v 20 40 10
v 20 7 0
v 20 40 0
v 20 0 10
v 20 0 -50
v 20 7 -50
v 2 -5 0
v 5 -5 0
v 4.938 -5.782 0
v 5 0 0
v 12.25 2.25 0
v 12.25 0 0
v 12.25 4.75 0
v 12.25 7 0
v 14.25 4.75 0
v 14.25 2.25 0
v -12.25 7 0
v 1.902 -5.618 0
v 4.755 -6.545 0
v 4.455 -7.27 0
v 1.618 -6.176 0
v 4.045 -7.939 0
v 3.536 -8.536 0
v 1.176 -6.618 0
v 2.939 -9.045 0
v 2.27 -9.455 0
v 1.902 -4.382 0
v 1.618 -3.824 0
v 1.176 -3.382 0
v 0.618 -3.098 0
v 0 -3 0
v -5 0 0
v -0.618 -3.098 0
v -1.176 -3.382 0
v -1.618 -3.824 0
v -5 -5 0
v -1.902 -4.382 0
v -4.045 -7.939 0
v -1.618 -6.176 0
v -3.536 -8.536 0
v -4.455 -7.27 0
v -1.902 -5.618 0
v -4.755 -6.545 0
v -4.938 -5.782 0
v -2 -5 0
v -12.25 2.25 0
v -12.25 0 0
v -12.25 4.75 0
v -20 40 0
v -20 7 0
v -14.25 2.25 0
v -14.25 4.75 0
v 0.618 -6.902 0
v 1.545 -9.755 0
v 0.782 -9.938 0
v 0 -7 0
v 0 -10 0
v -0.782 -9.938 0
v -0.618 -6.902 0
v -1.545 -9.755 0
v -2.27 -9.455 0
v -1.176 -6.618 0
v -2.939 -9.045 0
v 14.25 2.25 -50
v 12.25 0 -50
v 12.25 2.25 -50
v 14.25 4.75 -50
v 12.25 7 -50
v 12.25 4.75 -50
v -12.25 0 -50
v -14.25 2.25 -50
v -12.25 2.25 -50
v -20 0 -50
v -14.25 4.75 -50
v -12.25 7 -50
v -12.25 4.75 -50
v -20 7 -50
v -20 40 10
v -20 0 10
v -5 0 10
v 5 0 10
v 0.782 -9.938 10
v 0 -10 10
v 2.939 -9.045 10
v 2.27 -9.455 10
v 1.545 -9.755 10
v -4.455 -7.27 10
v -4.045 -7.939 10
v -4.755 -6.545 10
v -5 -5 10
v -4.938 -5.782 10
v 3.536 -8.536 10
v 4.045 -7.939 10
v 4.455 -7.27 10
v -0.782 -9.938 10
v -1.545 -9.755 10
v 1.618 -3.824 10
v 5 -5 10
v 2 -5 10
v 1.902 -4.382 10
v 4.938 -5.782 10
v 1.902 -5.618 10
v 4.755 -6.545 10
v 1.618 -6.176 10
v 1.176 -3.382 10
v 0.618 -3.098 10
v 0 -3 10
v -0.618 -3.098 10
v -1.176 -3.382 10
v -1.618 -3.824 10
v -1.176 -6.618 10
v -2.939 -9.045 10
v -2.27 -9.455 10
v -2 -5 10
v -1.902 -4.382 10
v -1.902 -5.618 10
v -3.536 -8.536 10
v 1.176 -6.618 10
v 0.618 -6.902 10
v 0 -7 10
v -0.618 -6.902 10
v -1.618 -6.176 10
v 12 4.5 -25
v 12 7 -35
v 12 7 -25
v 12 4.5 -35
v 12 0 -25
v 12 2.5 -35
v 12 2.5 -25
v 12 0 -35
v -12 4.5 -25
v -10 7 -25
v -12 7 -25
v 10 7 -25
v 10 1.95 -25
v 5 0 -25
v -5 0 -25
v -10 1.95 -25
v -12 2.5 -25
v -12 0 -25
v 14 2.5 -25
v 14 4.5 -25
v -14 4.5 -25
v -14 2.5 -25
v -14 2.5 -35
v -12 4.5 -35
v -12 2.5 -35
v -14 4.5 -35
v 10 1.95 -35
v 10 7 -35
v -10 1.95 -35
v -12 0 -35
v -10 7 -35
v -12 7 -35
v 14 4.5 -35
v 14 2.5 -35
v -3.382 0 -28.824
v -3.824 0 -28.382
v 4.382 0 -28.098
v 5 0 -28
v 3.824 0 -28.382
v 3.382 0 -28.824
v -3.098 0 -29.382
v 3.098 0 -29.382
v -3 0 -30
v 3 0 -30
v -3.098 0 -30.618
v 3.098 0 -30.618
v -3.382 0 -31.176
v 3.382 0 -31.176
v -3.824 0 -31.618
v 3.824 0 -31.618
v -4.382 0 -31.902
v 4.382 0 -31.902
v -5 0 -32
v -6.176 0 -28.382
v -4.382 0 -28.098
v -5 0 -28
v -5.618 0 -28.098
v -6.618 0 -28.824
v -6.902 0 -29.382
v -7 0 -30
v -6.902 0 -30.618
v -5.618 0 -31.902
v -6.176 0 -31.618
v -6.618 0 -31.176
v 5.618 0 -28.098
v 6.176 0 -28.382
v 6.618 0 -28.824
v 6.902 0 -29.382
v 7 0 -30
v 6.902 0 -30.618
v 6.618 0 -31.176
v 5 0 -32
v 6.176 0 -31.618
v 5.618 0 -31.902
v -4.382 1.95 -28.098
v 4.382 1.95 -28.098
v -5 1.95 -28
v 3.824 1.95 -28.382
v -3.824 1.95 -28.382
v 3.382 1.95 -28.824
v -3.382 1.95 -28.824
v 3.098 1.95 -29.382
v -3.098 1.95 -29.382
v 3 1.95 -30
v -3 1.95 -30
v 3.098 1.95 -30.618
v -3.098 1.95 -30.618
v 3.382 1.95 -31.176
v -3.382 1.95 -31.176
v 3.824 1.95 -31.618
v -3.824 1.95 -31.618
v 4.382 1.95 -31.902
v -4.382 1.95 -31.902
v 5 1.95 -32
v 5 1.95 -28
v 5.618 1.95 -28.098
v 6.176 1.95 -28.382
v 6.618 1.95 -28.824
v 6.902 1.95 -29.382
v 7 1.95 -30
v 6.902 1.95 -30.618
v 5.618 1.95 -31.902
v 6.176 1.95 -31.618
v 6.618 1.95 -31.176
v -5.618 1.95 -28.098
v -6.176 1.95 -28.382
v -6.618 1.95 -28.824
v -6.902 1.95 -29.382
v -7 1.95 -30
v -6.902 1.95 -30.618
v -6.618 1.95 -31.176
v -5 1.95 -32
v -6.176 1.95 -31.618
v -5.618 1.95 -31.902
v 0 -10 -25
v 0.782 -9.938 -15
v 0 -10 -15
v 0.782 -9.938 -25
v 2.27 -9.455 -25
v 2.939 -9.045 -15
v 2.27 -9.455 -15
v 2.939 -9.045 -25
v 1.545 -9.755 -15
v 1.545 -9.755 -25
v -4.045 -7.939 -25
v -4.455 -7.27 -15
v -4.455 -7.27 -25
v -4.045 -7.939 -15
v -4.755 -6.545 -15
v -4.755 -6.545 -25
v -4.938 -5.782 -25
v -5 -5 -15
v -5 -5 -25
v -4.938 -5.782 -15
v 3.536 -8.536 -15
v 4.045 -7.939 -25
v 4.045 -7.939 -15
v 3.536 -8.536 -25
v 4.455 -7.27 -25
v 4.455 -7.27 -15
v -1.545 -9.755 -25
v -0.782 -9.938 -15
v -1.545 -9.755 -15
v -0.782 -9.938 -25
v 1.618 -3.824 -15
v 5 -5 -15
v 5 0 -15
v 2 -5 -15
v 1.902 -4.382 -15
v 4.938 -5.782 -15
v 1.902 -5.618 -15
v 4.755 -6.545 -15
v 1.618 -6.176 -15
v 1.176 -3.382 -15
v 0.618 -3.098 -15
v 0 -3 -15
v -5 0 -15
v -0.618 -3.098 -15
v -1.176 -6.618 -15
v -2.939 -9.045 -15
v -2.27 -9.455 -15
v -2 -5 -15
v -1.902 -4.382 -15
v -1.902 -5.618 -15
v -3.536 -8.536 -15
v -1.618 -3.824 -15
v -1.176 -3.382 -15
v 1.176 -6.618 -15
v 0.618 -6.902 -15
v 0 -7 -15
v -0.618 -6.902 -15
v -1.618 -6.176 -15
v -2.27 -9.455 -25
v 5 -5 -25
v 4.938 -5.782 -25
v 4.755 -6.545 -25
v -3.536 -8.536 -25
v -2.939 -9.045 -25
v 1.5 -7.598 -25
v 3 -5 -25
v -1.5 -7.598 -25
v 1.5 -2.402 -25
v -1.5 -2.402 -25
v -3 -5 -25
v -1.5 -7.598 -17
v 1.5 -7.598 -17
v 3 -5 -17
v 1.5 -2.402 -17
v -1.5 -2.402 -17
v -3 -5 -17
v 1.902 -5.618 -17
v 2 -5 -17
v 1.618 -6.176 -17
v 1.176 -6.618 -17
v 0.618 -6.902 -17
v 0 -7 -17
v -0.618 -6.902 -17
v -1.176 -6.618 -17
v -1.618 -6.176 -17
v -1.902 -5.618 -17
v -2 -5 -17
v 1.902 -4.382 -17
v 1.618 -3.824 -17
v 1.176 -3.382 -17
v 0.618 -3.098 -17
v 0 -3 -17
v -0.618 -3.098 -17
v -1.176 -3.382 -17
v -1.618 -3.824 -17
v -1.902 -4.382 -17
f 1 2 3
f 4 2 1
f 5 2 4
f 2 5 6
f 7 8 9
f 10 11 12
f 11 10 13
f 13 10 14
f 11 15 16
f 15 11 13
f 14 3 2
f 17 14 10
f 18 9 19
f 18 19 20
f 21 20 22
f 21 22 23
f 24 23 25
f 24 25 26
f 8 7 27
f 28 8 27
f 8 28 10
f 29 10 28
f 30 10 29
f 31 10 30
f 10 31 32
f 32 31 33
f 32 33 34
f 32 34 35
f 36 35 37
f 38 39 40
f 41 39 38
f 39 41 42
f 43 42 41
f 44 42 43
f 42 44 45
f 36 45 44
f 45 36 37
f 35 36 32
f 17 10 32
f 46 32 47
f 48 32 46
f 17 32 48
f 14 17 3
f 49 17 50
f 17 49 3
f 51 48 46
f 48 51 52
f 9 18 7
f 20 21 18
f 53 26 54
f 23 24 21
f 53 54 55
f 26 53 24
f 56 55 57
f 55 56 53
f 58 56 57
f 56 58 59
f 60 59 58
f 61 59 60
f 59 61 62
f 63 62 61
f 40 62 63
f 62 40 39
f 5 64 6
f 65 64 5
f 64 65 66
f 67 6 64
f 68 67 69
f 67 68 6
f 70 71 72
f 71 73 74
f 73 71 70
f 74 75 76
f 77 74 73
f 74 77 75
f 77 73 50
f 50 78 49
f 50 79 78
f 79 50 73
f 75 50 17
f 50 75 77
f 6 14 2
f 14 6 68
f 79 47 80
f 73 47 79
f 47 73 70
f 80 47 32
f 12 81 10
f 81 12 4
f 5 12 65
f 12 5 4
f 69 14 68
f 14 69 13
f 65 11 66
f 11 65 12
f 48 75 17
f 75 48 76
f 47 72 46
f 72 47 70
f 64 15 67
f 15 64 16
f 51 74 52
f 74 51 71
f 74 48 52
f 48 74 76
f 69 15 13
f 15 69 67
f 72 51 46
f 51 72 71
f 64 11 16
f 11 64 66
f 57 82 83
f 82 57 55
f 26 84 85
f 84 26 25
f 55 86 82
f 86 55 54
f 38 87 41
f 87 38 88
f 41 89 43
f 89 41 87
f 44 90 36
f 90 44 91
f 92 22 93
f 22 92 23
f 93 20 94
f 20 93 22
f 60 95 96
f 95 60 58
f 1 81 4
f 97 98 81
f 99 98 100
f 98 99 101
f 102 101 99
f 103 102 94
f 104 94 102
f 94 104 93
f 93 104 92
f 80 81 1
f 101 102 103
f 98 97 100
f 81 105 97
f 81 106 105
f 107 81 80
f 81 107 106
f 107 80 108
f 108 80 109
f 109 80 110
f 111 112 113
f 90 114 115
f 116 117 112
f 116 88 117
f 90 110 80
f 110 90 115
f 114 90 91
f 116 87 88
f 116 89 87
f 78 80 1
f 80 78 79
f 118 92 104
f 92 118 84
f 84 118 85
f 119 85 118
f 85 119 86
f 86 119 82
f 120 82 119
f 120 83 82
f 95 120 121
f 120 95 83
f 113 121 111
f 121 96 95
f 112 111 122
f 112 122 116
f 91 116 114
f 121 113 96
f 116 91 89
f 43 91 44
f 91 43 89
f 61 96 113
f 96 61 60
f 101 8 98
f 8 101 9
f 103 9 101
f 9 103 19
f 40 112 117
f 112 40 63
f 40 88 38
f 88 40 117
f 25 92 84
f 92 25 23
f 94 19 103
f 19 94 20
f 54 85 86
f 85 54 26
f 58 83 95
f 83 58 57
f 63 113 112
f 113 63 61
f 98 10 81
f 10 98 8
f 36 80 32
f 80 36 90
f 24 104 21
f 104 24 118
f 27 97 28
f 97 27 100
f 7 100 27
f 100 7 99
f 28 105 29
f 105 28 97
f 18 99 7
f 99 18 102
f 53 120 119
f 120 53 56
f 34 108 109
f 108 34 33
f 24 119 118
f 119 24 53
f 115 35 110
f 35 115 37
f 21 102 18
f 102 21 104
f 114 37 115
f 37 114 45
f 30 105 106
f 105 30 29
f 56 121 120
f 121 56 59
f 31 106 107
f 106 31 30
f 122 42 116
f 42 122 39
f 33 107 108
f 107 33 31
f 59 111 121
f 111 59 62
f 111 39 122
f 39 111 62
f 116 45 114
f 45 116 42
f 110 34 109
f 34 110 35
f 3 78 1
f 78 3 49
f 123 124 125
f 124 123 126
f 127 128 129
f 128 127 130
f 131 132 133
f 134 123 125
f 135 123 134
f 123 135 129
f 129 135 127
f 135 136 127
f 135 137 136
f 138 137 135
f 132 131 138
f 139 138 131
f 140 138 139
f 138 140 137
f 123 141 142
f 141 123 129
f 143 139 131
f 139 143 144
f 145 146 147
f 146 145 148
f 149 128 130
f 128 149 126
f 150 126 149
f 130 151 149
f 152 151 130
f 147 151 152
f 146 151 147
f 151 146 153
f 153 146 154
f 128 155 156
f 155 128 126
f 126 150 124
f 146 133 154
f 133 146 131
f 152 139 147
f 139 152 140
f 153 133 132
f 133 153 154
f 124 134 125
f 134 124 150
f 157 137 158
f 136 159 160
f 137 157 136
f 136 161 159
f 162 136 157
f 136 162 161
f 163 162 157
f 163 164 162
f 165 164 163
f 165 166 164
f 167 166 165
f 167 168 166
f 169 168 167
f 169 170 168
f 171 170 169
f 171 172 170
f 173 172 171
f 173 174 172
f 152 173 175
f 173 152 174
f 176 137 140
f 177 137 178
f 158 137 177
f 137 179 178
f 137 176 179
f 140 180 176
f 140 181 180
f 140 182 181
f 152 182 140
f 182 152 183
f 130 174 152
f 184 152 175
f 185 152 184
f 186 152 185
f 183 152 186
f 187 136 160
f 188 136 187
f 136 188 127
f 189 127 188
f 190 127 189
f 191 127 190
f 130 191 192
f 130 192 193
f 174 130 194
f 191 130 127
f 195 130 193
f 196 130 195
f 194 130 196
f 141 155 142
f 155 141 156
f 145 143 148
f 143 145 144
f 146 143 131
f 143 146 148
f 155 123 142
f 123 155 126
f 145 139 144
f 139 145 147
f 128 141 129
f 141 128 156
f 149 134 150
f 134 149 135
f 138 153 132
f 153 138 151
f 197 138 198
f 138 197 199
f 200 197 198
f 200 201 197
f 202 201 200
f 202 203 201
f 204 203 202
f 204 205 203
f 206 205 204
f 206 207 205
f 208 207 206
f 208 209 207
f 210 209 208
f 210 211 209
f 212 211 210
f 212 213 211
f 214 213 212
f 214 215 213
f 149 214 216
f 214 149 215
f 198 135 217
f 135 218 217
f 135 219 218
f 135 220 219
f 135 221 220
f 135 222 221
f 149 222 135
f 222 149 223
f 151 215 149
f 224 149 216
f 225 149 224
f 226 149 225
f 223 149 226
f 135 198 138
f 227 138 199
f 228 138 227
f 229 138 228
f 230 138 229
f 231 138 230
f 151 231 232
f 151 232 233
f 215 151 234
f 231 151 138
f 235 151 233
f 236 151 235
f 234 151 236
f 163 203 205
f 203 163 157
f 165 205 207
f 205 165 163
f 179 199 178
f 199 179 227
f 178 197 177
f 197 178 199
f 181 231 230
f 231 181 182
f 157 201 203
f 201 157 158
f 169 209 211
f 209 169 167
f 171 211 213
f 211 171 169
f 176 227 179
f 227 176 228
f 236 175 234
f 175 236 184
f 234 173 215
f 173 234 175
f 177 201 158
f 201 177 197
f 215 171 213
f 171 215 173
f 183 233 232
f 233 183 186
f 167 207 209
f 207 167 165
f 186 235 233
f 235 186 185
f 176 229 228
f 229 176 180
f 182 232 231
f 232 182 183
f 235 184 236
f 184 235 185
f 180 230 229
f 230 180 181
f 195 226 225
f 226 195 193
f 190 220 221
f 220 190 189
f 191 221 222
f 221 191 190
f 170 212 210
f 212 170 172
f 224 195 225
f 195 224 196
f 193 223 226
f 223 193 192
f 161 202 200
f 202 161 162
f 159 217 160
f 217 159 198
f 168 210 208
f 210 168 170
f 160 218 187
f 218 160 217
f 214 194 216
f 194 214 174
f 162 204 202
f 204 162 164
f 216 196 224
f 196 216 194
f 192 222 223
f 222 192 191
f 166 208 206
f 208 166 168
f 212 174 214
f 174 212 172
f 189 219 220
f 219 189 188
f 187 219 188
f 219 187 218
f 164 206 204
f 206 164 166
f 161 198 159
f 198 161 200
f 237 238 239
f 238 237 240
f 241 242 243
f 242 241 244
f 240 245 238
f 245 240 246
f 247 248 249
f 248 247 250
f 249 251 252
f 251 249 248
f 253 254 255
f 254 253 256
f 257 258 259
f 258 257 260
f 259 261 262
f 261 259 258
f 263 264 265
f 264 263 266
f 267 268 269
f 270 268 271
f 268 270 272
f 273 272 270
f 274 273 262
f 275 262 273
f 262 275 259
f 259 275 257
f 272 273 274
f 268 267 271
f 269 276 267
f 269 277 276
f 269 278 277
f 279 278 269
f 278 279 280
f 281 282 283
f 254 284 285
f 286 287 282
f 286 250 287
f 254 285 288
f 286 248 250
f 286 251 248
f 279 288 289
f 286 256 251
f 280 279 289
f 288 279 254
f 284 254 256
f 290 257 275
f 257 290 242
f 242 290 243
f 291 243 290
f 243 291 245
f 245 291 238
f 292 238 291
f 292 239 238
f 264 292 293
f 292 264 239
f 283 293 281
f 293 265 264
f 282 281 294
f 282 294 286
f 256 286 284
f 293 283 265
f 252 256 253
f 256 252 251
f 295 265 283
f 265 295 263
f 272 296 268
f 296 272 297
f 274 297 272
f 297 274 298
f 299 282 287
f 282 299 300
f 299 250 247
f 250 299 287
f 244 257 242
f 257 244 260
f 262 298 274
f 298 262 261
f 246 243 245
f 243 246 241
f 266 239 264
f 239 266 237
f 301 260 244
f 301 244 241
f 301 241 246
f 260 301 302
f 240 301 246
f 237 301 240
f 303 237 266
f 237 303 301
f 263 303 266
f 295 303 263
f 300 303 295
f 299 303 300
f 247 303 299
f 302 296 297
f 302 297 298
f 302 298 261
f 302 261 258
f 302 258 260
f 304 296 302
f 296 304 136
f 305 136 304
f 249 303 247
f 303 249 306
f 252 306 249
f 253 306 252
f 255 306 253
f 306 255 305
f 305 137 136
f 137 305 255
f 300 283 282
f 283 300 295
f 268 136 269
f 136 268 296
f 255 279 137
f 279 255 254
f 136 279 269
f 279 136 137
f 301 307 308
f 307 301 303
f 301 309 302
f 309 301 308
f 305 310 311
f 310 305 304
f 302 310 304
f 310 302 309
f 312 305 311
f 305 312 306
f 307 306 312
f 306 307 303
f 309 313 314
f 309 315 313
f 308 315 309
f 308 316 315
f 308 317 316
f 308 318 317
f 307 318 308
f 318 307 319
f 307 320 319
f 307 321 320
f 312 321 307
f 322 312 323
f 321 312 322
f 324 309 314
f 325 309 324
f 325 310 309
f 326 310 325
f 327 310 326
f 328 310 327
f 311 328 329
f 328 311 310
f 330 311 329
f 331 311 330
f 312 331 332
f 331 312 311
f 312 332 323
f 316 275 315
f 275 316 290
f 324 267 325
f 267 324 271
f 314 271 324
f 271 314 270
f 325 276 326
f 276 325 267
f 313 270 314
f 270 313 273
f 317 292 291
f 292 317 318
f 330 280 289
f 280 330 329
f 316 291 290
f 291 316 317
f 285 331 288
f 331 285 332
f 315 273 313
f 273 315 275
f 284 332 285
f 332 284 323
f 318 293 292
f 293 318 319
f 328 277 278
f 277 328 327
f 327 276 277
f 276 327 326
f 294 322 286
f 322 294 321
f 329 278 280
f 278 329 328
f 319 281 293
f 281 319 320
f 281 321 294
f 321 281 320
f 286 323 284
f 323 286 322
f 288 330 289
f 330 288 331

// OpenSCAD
longueur_switch = 20;
largeur_switch = 5;
hauteur_switch = 10;
epaisseur = 2;
diam_ecrou = 6;
diam_vis = 4;
hauteur_barre= 40;

module glissiere_switch() {
    difference(){
        union(){
            cube([longueur_switch+2*epaisseur, largeur_switch+epaisseur, hauteur_switch], center=true);
            cube([longueur_switch+4*epaisseur, epaisseur, hauteur_switch],center=true);
        }
        translate([0,epaisseur/2,0])
        cube([longueur_switch, largeur_switch+0.1, hauteur_switch+0.1],center=true);
        translate([-5,0,0])
        rotate([90,0,0])
        cylinder(d=4, h=largeur_switch+2*epaisseur, $fn=20);
        translate([5,0,0])
        rotate([90,0,0])
        cylinder(d=4, h=largeur_switch+2*epaisseur, $fn=20);
    }
    translate([0,-(largeur_switch+epaisseur)/2-(diam_ecrou+2*epaisseur)/2,hauteur_switch])
    difference(){
        union(){
            cylinder(d=diam_ecrou+2*epaisseur, h=10, $fn=40, center=true);
            translate([0,(diam_ecrou+2*epaisseur)/4,0])
            cube([diam_ecrou+2*epaisseur,(diam_ecrou+2*epaisseur)/2,10], center=true);
        }
        translate([0,0,-epaisseur])
            cylinder(d=diam_ecrou, h=10, $fn=6, center=true);
        cylinder(d=diam_vis, h=20, $fn=20, center=true);
    }
}

module support_glissiere() {
    translate([0,(largeur_switch+epaisseur)/2,-25])
    difference(){
        cube([longueur_switch+10*epaisseur, largeur_switch+epaisseur, 50], center=true);
        cube([longueur_switch+2*epaisseur+0.5, largeur_switch+epaisseur+0.1, 51], center=true);
        cube([longueur_switch+4*epaisseur+0.5, epaisseur+0.5, 51], center=true);
    }
    translate([-(longueur_switch+10*epaisseur)/2,0,0])
    cube([longueur_switch+10*epaisseur, hauteur_barre, 10]);
    translate([0,-(diam_ecrou+2*epaisseur)/2,5])
    difference(){
        union(){
            cylinder(d=diam_ecrou+2*epaisseur, h=10, $fn=40, center=true);
            translate([0,(diam_ecrou+2*epaisseur)/4,0])
            cube([diam_ecrou+2*epaisseur,(diam_ecrou+2*epaisseur)/2,10], center=true);
        }
        
        cylinder(d=diam_vis, h=20, $fn=20, center=true);
    }
}

support_glissiere();
translate([0,(largeur_switch+epaisseur)/2,-30])
glissiere_switch();
